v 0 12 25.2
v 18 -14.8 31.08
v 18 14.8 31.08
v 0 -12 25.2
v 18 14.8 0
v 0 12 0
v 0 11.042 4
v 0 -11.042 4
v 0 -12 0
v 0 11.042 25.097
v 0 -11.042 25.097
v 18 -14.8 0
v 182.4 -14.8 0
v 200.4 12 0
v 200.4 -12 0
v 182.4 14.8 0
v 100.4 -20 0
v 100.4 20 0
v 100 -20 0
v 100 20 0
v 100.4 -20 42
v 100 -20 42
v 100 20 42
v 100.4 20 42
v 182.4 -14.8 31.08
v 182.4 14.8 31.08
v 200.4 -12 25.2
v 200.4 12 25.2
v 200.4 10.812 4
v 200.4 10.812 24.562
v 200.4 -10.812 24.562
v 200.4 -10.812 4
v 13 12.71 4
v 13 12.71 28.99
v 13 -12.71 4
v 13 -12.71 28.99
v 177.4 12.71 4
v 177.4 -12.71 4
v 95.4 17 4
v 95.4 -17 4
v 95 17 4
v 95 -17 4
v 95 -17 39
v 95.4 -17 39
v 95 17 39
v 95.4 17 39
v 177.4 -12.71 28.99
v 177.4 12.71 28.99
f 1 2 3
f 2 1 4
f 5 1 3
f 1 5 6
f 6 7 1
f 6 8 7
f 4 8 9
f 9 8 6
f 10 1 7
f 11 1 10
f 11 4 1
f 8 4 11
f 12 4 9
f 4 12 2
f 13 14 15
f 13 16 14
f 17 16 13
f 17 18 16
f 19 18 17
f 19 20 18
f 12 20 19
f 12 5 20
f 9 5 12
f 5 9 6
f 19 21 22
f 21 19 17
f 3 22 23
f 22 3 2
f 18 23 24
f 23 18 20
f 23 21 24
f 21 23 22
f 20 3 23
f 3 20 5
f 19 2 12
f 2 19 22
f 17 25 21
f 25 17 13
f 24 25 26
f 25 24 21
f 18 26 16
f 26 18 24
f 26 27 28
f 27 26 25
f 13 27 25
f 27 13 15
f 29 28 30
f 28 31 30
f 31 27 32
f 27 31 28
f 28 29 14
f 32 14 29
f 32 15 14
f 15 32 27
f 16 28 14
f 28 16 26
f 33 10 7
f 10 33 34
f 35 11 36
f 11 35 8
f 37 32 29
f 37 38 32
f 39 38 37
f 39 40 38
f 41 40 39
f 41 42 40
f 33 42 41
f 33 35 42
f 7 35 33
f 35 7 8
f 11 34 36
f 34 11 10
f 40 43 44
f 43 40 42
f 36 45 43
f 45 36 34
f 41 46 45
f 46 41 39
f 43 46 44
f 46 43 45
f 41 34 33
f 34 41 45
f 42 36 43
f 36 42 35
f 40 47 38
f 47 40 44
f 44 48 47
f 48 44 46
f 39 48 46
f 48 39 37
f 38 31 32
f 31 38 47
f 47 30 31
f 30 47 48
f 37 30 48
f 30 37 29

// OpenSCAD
$fn = 32;

// ----------------------------------------------------------------------
// Faired channel: 200 x 40 x 42 mm, 3 mm walls, faired ends
// ----------------------------------------------------------------------

// --- parameters (mm) ---
length = 200;             // channel length
width = 40;               // channel width at mid length
height = 42;              // channel height at mid length
wall = 3;                 // side wall thickness
floor_t = 4;              // floor thickness
end_w = 24;               // faired end width
end_h = 25.2;             // faired end height

difference() {
  union() {
    hull() {
      translate([0, -12, 0]) cube([0.4, 24, 25.2]);
      translate([18, -14.8, 0]) cube([0.4, 29.6, 31.08]);
    }
    hull() {
      translate([18, -14.8, 0]) cube([0.4, 29.6, 31.08]);
      translate([100, -20, 0]) cube([0.4, 40, 42]);
    }
    hull() {
      translate([100, -20, 0]) cube([0.4, 40, 42]);
      translate([182, -14.8, 0]) cube([0.4, 29.6, 31.08]);
    }
    hull() {
      translate([182, -14.8, 0]) cube([0.4, 29.6, 31.08]);
      translate([200, -12, 0]) cube([0.4, 24, 25.2]);
    }
  }
  /* cavity, 5 mm proud of both ends so the ports are cut clean */
  hull() {
    translate([-5, -10.4, 4]) cube([0.4, 20.8, 19.6]);
    translate([13, -12.71, 4]) cube([0.4, 25.42, 24.99]);
  }
  hull() {
    translate([13, -12.71, 4]) cube([0.4, 25.42, 24.99]);
    translate([95, -17, 4]) cube([0.4, 34, 35]);
  }
  hull() {
    translate([95, -17, 4]) cube([0.4, 34, 35]);
    translate([177, -12.71, 4]) cube([0.4, 25.42, 24.99]);
  }
  hull() {
    translate([177, -12.71, 4]) cube([0.4, 25.42, 24.99]);
    translate([205, -10.4, 4]) cube([0.4, 20.8, 19.6]);
  }
}
